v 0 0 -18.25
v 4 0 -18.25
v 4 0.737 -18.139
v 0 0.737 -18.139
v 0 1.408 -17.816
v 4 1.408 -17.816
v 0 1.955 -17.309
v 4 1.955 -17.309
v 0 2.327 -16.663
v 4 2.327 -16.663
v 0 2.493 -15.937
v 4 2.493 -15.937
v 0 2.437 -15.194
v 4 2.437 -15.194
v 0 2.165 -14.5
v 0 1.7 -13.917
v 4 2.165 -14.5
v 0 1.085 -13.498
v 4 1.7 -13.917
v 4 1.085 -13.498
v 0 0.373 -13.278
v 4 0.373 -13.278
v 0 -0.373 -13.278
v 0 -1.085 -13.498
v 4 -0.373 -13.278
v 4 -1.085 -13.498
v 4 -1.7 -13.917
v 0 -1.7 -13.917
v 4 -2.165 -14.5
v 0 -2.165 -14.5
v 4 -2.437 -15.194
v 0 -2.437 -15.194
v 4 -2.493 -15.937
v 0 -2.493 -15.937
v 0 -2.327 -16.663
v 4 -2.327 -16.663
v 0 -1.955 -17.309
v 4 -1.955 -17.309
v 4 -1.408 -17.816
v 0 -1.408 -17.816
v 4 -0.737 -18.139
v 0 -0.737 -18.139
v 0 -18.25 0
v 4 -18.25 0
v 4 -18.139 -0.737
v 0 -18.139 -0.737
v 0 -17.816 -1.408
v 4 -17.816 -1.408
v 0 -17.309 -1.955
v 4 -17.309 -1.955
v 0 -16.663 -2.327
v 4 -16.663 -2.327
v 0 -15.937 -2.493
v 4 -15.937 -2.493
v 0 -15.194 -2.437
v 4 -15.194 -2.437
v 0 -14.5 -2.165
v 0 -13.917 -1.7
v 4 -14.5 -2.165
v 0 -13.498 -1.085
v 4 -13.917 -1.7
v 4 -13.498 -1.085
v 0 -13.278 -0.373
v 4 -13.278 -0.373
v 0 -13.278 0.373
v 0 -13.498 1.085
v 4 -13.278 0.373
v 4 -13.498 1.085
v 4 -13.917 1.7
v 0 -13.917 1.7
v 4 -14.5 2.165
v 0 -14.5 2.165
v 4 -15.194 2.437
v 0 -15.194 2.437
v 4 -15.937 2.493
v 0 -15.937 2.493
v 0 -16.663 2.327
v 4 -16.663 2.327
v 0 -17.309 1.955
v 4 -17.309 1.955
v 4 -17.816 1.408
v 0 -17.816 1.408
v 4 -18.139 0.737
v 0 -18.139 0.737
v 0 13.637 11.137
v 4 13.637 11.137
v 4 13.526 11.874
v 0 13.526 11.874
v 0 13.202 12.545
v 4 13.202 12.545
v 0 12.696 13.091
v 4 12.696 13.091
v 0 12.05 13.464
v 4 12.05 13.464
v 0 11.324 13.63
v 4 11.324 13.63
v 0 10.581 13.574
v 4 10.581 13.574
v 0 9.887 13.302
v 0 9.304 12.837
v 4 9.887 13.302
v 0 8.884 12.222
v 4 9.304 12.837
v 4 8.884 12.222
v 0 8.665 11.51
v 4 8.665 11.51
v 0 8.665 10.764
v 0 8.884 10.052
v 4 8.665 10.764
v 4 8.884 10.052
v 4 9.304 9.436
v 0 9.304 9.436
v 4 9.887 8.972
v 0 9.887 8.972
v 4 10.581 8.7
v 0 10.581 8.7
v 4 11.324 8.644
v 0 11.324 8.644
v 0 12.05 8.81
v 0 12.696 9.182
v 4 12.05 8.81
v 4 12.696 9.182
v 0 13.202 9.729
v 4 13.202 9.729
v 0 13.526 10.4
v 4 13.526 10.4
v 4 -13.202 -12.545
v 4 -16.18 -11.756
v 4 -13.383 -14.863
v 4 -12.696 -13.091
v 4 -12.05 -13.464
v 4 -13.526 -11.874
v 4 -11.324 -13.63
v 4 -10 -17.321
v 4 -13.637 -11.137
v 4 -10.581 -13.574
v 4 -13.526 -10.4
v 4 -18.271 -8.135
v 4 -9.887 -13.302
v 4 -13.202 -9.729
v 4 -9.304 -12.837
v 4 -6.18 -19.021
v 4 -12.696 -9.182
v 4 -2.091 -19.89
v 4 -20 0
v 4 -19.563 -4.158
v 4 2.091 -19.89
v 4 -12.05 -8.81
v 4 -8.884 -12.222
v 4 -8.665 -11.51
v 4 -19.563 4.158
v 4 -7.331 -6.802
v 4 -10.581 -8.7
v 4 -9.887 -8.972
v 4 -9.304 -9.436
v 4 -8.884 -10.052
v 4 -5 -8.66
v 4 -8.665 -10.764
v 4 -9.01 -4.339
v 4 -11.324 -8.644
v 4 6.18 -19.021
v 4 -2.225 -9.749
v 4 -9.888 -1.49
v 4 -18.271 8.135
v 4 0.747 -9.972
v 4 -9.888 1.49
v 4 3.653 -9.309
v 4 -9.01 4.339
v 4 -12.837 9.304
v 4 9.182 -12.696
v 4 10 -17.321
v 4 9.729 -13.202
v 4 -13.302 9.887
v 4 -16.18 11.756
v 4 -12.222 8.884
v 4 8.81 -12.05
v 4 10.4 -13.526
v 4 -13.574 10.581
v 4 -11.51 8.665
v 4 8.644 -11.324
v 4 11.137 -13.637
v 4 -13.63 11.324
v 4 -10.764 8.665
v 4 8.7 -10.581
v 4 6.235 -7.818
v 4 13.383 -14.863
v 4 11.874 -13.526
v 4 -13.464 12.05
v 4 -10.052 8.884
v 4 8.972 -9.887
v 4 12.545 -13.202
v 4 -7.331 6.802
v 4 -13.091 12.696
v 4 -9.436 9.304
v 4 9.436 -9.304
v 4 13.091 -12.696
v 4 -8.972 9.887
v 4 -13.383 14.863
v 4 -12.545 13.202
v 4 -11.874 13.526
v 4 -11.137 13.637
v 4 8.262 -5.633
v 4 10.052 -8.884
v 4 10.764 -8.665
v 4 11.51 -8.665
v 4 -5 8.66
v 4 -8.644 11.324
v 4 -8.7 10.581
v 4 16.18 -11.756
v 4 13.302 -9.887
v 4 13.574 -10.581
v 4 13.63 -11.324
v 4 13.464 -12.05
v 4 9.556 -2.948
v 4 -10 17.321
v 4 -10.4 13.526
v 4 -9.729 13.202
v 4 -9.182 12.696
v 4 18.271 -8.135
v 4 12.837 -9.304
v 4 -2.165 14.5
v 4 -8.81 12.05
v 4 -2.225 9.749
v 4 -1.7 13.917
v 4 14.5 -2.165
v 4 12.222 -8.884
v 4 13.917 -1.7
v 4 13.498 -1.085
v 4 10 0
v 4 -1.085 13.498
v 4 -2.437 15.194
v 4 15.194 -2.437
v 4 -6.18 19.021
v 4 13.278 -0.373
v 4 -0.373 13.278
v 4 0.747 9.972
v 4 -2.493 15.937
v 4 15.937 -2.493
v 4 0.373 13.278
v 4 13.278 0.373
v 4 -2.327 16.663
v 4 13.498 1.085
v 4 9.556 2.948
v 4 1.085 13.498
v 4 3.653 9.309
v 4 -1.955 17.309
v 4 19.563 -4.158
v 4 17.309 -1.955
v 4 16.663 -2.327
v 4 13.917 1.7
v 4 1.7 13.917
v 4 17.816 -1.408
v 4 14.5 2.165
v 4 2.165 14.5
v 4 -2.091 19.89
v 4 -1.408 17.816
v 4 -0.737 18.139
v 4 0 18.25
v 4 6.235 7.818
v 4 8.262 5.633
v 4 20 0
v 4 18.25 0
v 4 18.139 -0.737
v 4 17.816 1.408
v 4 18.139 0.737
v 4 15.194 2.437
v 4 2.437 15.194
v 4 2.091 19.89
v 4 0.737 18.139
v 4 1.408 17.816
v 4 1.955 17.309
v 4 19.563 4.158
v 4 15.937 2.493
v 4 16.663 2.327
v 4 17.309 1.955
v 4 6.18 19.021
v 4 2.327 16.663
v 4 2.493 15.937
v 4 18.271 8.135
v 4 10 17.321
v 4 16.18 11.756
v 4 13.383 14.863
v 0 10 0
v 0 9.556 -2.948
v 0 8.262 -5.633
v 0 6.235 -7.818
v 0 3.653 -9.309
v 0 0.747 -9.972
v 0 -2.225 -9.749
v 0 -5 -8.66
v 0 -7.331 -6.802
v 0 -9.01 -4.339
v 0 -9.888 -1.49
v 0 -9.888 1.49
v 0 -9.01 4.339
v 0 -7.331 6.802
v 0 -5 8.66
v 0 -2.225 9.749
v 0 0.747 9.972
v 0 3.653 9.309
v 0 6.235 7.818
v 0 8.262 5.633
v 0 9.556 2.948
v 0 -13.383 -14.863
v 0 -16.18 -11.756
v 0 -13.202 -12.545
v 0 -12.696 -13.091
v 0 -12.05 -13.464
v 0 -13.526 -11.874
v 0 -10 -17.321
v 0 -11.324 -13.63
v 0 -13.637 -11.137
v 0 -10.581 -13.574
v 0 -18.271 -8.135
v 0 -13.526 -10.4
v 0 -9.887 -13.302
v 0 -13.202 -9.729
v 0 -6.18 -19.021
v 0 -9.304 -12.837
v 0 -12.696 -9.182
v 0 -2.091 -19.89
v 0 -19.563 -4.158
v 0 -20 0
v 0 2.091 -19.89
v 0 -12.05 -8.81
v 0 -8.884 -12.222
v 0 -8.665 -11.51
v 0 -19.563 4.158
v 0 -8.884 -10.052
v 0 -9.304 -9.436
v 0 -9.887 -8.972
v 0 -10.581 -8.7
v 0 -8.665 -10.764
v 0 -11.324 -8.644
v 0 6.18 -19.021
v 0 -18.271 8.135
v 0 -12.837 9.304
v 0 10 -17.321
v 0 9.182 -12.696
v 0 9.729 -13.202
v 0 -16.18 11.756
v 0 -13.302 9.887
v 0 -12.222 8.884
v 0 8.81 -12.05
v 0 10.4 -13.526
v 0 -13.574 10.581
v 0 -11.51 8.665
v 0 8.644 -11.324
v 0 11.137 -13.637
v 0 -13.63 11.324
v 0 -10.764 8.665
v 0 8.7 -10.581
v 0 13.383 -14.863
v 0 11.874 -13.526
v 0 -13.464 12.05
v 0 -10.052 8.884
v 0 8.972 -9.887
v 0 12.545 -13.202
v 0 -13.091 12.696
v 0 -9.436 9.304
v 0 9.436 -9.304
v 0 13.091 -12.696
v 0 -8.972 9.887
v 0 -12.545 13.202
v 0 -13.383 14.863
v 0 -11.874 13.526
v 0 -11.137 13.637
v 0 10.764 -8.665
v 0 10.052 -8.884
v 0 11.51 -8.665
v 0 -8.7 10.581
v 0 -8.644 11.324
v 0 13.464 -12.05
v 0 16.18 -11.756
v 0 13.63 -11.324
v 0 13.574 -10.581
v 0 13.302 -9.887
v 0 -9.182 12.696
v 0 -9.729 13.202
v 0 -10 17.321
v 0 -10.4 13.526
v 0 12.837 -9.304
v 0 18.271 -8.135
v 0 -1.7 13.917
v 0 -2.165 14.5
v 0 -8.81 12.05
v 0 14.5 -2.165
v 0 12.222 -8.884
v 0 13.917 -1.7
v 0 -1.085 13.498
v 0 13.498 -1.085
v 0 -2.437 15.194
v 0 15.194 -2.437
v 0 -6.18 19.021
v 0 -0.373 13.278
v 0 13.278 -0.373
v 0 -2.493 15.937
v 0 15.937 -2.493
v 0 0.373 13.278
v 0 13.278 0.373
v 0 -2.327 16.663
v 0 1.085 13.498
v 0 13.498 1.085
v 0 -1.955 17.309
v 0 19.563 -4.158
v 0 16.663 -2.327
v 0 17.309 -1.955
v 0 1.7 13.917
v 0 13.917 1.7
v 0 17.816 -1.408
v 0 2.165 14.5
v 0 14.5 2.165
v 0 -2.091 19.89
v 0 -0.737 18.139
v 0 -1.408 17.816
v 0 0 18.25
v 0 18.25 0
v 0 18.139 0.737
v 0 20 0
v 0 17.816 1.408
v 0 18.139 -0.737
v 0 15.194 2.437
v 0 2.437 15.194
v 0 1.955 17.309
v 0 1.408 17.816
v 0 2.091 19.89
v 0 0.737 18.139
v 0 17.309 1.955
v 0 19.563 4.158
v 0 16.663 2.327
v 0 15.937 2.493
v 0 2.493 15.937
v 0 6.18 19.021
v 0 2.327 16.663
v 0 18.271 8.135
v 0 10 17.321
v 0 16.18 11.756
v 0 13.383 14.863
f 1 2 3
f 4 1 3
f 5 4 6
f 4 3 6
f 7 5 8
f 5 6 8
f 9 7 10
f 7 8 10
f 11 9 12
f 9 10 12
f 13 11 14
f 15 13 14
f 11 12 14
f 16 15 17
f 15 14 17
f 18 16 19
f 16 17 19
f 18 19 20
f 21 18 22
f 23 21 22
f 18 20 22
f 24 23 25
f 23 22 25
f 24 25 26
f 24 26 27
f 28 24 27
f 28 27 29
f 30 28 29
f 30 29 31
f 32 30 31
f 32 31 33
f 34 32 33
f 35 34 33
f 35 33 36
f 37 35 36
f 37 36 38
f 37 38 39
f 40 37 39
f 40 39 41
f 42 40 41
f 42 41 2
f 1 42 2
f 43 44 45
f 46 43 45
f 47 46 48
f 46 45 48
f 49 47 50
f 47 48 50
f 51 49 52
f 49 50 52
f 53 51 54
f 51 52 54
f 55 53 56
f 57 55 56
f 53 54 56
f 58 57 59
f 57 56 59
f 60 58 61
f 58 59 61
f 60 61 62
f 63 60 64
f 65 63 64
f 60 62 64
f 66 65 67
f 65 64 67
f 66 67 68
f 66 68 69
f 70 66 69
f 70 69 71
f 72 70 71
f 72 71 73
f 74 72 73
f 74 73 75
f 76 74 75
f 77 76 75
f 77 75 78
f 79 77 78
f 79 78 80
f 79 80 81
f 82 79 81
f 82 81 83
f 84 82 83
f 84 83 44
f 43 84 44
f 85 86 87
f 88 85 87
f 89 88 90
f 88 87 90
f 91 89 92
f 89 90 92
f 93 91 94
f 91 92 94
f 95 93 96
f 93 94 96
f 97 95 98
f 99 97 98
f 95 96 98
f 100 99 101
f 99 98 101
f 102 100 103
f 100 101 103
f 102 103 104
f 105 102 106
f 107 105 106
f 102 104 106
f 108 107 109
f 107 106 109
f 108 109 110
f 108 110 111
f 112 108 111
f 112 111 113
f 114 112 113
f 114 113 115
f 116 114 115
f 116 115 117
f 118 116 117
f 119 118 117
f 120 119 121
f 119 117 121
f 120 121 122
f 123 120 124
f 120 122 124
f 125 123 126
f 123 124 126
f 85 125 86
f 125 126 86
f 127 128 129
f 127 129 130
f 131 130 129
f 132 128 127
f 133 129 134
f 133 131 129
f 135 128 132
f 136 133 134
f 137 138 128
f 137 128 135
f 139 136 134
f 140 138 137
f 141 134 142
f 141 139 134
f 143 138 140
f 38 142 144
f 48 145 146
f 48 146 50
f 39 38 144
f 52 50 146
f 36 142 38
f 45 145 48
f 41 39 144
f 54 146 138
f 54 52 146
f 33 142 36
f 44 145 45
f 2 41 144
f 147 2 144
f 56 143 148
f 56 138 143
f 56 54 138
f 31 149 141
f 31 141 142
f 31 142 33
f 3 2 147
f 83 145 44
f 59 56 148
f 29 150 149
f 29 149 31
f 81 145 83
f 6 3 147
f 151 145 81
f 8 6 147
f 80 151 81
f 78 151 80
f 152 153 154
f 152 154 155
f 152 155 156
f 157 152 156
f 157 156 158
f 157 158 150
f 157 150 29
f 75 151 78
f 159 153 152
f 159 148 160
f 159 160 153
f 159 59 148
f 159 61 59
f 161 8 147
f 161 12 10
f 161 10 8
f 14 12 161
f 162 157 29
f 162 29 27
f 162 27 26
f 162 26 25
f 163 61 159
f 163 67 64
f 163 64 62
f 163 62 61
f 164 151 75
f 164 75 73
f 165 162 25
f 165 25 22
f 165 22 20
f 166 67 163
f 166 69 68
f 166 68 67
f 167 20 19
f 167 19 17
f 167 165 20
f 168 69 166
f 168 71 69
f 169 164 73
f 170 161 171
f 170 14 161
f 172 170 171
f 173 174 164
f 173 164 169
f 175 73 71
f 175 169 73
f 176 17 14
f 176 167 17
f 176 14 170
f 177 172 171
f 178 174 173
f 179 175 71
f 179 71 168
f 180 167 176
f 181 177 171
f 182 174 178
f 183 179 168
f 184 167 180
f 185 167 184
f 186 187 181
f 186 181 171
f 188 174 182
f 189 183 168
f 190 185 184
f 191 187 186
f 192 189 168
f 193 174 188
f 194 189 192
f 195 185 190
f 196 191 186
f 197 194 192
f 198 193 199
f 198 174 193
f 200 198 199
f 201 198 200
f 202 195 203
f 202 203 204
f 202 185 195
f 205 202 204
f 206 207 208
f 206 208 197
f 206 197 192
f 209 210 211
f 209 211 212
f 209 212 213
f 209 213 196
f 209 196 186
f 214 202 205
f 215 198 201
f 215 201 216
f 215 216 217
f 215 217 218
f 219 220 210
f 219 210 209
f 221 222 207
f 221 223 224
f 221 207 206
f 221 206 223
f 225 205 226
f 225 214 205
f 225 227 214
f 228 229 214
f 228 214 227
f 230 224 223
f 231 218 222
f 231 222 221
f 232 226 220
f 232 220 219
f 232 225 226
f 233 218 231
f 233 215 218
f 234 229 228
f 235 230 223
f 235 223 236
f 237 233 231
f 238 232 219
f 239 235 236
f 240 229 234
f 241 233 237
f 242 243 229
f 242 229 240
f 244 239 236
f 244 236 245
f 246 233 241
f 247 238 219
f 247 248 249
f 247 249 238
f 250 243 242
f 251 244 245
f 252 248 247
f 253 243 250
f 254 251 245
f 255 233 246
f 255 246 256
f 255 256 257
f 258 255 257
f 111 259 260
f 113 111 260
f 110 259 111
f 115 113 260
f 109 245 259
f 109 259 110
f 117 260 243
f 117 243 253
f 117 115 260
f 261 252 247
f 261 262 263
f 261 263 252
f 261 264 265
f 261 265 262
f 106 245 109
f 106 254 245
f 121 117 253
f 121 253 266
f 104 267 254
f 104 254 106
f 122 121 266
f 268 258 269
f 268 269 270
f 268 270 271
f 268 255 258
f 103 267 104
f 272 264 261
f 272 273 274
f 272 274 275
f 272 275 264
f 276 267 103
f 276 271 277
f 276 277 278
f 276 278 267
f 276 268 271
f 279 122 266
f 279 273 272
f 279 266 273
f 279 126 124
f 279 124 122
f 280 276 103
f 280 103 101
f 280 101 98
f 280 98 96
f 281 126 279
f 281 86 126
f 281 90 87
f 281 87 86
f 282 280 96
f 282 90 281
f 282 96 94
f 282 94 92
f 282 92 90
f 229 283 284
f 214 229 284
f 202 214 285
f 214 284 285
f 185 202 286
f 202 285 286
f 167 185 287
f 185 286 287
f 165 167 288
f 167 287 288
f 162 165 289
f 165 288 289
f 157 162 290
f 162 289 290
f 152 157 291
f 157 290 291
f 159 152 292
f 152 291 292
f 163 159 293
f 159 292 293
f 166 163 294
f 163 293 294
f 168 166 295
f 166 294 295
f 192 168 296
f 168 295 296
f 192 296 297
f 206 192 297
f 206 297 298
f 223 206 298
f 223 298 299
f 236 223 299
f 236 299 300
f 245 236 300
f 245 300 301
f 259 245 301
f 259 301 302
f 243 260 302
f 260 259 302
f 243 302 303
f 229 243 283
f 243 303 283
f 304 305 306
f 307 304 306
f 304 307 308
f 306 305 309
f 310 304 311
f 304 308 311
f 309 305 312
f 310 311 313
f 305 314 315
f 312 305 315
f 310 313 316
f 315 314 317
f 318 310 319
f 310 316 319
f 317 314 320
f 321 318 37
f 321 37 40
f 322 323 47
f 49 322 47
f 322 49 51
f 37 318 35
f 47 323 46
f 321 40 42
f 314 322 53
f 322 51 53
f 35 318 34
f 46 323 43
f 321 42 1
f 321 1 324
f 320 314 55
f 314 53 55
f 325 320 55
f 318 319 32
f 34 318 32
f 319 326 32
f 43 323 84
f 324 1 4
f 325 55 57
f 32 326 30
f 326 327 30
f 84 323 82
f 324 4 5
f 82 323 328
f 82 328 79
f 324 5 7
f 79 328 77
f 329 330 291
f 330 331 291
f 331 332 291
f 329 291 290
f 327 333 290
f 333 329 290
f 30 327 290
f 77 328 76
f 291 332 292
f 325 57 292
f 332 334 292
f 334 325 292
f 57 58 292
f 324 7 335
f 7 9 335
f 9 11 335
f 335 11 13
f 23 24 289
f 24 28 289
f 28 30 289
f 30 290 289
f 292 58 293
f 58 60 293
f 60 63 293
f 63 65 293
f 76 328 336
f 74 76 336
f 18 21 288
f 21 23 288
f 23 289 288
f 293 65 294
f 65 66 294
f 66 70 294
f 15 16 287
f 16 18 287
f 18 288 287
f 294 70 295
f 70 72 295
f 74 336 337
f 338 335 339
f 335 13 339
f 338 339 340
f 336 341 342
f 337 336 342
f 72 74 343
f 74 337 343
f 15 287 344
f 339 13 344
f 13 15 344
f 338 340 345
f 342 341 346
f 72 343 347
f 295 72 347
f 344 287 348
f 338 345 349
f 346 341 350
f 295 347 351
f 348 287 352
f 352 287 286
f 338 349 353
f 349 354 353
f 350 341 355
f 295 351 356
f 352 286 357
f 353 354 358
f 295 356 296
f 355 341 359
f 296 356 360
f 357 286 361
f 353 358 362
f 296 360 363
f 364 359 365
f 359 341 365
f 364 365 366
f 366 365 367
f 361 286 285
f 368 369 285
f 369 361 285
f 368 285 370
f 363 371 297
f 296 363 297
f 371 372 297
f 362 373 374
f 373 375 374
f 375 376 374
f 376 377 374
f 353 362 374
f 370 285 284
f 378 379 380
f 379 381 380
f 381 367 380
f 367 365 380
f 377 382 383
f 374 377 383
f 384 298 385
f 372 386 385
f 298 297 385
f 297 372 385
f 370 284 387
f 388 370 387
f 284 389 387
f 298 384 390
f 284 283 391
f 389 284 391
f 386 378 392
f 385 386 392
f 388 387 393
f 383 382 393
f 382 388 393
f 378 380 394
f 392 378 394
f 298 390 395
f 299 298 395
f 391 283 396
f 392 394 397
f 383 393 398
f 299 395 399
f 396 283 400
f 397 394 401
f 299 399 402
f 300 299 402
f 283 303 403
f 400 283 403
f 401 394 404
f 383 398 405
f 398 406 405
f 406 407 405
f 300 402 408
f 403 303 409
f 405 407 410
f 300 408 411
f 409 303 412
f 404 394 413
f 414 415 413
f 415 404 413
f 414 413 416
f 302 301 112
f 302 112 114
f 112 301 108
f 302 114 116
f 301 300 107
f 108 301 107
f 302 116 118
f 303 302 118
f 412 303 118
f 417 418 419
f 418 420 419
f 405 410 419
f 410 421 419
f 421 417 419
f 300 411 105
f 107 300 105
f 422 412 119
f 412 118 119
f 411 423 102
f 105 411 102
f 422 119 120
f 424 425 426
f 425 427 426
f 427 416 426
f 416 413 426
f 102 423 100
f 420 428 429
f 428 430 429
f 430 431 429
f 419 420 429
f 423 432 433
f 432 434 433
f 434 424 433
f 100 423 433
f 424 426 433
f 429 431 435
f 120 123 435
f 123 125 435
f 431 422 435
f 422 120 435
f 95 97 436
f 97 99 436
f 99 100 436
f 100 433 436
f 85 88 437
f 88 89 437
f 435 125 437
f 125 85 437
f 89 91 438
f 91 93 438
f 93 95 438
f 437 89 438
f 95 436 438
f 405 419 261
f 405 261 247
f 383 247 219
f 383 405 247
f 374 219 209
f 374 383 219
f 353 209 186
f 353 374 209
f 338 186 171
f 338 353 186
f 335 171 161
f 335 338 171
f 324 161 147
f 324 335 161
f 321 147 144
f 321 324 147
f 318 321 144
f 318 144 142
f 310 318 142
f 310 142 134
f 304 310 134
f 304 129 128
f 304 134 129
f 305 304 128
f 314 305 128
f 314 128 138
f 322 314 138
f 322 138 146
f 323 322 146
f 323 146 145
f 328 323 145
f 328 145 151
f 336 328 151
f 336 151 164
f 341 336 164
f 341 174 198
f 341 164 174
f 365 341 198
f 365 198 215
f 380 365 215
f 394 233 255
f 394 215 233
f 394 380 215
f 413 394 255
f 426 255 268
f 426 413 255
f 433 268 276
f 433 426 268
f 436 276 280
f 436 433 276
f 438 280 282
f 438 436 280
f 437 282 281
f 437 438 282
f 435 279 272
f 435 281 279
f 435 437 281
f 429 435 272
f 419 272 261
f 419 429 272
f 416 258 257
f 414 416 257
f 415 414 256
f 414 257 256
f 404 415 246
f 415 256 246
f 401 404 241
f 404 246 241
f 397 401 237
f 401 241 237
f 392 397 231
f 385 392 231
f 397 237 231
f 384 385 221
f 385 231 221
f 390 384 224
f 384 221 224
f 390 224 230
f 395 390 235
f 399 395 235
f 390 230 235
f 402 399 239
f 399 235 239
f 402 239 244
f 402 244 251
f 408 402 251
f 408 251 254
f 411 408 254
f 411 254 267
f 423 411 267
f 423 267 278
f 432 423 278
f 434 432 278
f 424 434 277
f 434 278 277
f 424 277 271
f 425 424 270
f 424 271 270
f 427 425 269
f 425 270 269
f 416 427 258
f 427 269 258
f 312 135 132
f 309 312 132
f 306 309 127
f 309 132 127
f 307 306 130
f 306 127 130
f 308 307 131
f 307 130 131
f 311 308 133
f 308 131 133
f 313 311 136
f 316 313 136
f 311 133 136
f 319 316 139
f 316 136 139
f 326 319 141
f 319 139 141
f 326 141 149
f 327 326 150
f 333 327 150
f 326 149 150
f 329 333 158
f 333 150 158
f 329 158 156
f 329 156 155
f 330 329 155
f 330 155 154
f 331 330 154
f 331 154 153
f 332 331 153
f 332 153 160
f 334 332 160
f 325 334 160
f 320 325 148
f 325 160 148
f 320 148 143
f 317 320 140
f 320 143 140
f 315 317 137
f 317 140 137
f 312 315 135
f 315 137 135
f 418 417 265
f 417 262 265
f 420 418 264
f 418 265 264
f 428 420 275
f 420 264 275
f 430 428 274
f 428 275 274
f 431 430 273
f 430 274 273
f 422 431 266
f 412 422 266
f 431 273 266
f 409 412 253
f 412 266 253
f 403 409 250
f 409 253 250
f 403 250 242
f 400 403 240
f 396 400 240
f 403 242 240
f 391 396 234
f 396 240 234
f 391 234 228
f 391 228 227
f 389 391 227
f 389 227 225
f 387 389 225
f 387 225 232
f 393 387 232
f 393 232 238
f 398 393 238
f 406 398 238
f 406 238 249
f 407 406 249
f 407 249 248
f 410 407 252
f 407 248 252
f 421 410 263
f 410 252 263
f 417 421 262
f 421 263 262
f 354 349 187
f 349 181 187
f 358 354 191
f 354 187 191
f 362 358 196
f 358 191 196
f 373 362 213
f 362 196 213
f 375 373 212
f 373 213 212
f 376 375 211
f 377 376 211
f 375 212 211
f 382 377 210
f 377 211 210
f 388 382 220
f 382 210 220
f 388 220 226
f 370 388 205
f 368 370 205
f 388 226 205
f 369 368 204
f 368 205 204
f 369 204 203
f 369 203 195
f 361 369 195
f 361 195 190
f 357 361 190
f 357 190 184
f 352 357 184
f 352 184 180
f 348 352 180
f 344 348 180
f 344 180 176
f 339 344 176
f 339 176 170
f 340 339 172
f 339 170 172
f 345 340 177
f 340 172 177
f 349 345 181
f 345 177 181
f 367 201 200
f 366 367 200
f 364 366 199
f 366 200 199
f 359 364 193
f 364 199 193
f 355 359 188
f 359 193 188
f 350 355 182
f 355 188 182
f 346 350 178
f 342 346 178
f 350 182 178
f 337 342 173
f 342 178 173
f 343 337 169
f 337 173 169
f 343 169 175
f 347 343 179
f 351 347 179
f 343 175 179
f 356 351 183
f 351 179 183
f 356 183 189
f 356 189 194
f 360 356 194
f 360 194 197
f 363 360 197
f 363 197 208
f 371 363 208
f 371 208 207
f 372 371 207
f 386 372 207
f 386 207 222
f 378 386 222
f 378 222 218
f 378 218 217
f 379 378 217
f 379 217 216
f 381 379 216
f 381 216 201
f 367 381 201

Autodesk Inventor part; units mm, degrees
ref_plane "YZ Plane" through (0, 0, 0) normal (1, 0, 0) x (0, 1, 0)
ref_plane "XZ Plane" through (0, 0, 0) normal (0, 1, 0) x (-1, 0, 0)
ref_plane "XY Plane" through (0, 0, 0) normal (0, 0, 1) x (1, 0, 0)
sketch "Sketch1" plane through (0, 0, 0) normal (1, 0, 0) x (0, 1, 0)
  circle A0 centre (0, 0) radius 10
  circle A1 centre (0, 0) radius 20
  dimension "d0" = 20
  dimension "d3" = 40
extrude "Extrusion1" add sketch "Sketch1" along normal blind 4
sketch "Sketch3" plane through (4, 0, 0) normal (1, 0, 0) x (0, 0, -1)
  line L0 (0, 0) -> (15.75, 0)
  circle A0 centre (15.75, 0) radius 2.5
  dimension "d4" = 15.75
  dimension "d5" = 5
extrude "Extrusion2" cut sketch "Sketch3" against normal blind 4
pattern_circular "Circular Pattern1" count 4 over 360 about axis through (-10, 0, 0) along (1, 0, 0) of "Extrusion2"
sketch "Sketch4" plane through (4, 0, 0) normal (1, 0, 0) x (0, 0, -1)
  line L0 (0, 0) -> (11.1369, 11.1369)
  line L1 (0, 0) -> (15.75, 0) construction
  circle A0 centre (11.1369, 11.1369) radius 2.5
  dimension "d11" = 15.75
  dimension "d12" = 45
  dimension "d13" = 5
extrude "Extrusion3" cut sketch "Sketch4" against normal blind 4
thread "Thread1" size "M5x0.8" class "6H" standard "ANSI Metric M Profile" full length
pattern_circular "Circular Pattern2" count 4 over 360 about axis through (-10, 0, 0) along (1, 0, 0) of "Extrusion3"
properties part number "Robot Flange"
